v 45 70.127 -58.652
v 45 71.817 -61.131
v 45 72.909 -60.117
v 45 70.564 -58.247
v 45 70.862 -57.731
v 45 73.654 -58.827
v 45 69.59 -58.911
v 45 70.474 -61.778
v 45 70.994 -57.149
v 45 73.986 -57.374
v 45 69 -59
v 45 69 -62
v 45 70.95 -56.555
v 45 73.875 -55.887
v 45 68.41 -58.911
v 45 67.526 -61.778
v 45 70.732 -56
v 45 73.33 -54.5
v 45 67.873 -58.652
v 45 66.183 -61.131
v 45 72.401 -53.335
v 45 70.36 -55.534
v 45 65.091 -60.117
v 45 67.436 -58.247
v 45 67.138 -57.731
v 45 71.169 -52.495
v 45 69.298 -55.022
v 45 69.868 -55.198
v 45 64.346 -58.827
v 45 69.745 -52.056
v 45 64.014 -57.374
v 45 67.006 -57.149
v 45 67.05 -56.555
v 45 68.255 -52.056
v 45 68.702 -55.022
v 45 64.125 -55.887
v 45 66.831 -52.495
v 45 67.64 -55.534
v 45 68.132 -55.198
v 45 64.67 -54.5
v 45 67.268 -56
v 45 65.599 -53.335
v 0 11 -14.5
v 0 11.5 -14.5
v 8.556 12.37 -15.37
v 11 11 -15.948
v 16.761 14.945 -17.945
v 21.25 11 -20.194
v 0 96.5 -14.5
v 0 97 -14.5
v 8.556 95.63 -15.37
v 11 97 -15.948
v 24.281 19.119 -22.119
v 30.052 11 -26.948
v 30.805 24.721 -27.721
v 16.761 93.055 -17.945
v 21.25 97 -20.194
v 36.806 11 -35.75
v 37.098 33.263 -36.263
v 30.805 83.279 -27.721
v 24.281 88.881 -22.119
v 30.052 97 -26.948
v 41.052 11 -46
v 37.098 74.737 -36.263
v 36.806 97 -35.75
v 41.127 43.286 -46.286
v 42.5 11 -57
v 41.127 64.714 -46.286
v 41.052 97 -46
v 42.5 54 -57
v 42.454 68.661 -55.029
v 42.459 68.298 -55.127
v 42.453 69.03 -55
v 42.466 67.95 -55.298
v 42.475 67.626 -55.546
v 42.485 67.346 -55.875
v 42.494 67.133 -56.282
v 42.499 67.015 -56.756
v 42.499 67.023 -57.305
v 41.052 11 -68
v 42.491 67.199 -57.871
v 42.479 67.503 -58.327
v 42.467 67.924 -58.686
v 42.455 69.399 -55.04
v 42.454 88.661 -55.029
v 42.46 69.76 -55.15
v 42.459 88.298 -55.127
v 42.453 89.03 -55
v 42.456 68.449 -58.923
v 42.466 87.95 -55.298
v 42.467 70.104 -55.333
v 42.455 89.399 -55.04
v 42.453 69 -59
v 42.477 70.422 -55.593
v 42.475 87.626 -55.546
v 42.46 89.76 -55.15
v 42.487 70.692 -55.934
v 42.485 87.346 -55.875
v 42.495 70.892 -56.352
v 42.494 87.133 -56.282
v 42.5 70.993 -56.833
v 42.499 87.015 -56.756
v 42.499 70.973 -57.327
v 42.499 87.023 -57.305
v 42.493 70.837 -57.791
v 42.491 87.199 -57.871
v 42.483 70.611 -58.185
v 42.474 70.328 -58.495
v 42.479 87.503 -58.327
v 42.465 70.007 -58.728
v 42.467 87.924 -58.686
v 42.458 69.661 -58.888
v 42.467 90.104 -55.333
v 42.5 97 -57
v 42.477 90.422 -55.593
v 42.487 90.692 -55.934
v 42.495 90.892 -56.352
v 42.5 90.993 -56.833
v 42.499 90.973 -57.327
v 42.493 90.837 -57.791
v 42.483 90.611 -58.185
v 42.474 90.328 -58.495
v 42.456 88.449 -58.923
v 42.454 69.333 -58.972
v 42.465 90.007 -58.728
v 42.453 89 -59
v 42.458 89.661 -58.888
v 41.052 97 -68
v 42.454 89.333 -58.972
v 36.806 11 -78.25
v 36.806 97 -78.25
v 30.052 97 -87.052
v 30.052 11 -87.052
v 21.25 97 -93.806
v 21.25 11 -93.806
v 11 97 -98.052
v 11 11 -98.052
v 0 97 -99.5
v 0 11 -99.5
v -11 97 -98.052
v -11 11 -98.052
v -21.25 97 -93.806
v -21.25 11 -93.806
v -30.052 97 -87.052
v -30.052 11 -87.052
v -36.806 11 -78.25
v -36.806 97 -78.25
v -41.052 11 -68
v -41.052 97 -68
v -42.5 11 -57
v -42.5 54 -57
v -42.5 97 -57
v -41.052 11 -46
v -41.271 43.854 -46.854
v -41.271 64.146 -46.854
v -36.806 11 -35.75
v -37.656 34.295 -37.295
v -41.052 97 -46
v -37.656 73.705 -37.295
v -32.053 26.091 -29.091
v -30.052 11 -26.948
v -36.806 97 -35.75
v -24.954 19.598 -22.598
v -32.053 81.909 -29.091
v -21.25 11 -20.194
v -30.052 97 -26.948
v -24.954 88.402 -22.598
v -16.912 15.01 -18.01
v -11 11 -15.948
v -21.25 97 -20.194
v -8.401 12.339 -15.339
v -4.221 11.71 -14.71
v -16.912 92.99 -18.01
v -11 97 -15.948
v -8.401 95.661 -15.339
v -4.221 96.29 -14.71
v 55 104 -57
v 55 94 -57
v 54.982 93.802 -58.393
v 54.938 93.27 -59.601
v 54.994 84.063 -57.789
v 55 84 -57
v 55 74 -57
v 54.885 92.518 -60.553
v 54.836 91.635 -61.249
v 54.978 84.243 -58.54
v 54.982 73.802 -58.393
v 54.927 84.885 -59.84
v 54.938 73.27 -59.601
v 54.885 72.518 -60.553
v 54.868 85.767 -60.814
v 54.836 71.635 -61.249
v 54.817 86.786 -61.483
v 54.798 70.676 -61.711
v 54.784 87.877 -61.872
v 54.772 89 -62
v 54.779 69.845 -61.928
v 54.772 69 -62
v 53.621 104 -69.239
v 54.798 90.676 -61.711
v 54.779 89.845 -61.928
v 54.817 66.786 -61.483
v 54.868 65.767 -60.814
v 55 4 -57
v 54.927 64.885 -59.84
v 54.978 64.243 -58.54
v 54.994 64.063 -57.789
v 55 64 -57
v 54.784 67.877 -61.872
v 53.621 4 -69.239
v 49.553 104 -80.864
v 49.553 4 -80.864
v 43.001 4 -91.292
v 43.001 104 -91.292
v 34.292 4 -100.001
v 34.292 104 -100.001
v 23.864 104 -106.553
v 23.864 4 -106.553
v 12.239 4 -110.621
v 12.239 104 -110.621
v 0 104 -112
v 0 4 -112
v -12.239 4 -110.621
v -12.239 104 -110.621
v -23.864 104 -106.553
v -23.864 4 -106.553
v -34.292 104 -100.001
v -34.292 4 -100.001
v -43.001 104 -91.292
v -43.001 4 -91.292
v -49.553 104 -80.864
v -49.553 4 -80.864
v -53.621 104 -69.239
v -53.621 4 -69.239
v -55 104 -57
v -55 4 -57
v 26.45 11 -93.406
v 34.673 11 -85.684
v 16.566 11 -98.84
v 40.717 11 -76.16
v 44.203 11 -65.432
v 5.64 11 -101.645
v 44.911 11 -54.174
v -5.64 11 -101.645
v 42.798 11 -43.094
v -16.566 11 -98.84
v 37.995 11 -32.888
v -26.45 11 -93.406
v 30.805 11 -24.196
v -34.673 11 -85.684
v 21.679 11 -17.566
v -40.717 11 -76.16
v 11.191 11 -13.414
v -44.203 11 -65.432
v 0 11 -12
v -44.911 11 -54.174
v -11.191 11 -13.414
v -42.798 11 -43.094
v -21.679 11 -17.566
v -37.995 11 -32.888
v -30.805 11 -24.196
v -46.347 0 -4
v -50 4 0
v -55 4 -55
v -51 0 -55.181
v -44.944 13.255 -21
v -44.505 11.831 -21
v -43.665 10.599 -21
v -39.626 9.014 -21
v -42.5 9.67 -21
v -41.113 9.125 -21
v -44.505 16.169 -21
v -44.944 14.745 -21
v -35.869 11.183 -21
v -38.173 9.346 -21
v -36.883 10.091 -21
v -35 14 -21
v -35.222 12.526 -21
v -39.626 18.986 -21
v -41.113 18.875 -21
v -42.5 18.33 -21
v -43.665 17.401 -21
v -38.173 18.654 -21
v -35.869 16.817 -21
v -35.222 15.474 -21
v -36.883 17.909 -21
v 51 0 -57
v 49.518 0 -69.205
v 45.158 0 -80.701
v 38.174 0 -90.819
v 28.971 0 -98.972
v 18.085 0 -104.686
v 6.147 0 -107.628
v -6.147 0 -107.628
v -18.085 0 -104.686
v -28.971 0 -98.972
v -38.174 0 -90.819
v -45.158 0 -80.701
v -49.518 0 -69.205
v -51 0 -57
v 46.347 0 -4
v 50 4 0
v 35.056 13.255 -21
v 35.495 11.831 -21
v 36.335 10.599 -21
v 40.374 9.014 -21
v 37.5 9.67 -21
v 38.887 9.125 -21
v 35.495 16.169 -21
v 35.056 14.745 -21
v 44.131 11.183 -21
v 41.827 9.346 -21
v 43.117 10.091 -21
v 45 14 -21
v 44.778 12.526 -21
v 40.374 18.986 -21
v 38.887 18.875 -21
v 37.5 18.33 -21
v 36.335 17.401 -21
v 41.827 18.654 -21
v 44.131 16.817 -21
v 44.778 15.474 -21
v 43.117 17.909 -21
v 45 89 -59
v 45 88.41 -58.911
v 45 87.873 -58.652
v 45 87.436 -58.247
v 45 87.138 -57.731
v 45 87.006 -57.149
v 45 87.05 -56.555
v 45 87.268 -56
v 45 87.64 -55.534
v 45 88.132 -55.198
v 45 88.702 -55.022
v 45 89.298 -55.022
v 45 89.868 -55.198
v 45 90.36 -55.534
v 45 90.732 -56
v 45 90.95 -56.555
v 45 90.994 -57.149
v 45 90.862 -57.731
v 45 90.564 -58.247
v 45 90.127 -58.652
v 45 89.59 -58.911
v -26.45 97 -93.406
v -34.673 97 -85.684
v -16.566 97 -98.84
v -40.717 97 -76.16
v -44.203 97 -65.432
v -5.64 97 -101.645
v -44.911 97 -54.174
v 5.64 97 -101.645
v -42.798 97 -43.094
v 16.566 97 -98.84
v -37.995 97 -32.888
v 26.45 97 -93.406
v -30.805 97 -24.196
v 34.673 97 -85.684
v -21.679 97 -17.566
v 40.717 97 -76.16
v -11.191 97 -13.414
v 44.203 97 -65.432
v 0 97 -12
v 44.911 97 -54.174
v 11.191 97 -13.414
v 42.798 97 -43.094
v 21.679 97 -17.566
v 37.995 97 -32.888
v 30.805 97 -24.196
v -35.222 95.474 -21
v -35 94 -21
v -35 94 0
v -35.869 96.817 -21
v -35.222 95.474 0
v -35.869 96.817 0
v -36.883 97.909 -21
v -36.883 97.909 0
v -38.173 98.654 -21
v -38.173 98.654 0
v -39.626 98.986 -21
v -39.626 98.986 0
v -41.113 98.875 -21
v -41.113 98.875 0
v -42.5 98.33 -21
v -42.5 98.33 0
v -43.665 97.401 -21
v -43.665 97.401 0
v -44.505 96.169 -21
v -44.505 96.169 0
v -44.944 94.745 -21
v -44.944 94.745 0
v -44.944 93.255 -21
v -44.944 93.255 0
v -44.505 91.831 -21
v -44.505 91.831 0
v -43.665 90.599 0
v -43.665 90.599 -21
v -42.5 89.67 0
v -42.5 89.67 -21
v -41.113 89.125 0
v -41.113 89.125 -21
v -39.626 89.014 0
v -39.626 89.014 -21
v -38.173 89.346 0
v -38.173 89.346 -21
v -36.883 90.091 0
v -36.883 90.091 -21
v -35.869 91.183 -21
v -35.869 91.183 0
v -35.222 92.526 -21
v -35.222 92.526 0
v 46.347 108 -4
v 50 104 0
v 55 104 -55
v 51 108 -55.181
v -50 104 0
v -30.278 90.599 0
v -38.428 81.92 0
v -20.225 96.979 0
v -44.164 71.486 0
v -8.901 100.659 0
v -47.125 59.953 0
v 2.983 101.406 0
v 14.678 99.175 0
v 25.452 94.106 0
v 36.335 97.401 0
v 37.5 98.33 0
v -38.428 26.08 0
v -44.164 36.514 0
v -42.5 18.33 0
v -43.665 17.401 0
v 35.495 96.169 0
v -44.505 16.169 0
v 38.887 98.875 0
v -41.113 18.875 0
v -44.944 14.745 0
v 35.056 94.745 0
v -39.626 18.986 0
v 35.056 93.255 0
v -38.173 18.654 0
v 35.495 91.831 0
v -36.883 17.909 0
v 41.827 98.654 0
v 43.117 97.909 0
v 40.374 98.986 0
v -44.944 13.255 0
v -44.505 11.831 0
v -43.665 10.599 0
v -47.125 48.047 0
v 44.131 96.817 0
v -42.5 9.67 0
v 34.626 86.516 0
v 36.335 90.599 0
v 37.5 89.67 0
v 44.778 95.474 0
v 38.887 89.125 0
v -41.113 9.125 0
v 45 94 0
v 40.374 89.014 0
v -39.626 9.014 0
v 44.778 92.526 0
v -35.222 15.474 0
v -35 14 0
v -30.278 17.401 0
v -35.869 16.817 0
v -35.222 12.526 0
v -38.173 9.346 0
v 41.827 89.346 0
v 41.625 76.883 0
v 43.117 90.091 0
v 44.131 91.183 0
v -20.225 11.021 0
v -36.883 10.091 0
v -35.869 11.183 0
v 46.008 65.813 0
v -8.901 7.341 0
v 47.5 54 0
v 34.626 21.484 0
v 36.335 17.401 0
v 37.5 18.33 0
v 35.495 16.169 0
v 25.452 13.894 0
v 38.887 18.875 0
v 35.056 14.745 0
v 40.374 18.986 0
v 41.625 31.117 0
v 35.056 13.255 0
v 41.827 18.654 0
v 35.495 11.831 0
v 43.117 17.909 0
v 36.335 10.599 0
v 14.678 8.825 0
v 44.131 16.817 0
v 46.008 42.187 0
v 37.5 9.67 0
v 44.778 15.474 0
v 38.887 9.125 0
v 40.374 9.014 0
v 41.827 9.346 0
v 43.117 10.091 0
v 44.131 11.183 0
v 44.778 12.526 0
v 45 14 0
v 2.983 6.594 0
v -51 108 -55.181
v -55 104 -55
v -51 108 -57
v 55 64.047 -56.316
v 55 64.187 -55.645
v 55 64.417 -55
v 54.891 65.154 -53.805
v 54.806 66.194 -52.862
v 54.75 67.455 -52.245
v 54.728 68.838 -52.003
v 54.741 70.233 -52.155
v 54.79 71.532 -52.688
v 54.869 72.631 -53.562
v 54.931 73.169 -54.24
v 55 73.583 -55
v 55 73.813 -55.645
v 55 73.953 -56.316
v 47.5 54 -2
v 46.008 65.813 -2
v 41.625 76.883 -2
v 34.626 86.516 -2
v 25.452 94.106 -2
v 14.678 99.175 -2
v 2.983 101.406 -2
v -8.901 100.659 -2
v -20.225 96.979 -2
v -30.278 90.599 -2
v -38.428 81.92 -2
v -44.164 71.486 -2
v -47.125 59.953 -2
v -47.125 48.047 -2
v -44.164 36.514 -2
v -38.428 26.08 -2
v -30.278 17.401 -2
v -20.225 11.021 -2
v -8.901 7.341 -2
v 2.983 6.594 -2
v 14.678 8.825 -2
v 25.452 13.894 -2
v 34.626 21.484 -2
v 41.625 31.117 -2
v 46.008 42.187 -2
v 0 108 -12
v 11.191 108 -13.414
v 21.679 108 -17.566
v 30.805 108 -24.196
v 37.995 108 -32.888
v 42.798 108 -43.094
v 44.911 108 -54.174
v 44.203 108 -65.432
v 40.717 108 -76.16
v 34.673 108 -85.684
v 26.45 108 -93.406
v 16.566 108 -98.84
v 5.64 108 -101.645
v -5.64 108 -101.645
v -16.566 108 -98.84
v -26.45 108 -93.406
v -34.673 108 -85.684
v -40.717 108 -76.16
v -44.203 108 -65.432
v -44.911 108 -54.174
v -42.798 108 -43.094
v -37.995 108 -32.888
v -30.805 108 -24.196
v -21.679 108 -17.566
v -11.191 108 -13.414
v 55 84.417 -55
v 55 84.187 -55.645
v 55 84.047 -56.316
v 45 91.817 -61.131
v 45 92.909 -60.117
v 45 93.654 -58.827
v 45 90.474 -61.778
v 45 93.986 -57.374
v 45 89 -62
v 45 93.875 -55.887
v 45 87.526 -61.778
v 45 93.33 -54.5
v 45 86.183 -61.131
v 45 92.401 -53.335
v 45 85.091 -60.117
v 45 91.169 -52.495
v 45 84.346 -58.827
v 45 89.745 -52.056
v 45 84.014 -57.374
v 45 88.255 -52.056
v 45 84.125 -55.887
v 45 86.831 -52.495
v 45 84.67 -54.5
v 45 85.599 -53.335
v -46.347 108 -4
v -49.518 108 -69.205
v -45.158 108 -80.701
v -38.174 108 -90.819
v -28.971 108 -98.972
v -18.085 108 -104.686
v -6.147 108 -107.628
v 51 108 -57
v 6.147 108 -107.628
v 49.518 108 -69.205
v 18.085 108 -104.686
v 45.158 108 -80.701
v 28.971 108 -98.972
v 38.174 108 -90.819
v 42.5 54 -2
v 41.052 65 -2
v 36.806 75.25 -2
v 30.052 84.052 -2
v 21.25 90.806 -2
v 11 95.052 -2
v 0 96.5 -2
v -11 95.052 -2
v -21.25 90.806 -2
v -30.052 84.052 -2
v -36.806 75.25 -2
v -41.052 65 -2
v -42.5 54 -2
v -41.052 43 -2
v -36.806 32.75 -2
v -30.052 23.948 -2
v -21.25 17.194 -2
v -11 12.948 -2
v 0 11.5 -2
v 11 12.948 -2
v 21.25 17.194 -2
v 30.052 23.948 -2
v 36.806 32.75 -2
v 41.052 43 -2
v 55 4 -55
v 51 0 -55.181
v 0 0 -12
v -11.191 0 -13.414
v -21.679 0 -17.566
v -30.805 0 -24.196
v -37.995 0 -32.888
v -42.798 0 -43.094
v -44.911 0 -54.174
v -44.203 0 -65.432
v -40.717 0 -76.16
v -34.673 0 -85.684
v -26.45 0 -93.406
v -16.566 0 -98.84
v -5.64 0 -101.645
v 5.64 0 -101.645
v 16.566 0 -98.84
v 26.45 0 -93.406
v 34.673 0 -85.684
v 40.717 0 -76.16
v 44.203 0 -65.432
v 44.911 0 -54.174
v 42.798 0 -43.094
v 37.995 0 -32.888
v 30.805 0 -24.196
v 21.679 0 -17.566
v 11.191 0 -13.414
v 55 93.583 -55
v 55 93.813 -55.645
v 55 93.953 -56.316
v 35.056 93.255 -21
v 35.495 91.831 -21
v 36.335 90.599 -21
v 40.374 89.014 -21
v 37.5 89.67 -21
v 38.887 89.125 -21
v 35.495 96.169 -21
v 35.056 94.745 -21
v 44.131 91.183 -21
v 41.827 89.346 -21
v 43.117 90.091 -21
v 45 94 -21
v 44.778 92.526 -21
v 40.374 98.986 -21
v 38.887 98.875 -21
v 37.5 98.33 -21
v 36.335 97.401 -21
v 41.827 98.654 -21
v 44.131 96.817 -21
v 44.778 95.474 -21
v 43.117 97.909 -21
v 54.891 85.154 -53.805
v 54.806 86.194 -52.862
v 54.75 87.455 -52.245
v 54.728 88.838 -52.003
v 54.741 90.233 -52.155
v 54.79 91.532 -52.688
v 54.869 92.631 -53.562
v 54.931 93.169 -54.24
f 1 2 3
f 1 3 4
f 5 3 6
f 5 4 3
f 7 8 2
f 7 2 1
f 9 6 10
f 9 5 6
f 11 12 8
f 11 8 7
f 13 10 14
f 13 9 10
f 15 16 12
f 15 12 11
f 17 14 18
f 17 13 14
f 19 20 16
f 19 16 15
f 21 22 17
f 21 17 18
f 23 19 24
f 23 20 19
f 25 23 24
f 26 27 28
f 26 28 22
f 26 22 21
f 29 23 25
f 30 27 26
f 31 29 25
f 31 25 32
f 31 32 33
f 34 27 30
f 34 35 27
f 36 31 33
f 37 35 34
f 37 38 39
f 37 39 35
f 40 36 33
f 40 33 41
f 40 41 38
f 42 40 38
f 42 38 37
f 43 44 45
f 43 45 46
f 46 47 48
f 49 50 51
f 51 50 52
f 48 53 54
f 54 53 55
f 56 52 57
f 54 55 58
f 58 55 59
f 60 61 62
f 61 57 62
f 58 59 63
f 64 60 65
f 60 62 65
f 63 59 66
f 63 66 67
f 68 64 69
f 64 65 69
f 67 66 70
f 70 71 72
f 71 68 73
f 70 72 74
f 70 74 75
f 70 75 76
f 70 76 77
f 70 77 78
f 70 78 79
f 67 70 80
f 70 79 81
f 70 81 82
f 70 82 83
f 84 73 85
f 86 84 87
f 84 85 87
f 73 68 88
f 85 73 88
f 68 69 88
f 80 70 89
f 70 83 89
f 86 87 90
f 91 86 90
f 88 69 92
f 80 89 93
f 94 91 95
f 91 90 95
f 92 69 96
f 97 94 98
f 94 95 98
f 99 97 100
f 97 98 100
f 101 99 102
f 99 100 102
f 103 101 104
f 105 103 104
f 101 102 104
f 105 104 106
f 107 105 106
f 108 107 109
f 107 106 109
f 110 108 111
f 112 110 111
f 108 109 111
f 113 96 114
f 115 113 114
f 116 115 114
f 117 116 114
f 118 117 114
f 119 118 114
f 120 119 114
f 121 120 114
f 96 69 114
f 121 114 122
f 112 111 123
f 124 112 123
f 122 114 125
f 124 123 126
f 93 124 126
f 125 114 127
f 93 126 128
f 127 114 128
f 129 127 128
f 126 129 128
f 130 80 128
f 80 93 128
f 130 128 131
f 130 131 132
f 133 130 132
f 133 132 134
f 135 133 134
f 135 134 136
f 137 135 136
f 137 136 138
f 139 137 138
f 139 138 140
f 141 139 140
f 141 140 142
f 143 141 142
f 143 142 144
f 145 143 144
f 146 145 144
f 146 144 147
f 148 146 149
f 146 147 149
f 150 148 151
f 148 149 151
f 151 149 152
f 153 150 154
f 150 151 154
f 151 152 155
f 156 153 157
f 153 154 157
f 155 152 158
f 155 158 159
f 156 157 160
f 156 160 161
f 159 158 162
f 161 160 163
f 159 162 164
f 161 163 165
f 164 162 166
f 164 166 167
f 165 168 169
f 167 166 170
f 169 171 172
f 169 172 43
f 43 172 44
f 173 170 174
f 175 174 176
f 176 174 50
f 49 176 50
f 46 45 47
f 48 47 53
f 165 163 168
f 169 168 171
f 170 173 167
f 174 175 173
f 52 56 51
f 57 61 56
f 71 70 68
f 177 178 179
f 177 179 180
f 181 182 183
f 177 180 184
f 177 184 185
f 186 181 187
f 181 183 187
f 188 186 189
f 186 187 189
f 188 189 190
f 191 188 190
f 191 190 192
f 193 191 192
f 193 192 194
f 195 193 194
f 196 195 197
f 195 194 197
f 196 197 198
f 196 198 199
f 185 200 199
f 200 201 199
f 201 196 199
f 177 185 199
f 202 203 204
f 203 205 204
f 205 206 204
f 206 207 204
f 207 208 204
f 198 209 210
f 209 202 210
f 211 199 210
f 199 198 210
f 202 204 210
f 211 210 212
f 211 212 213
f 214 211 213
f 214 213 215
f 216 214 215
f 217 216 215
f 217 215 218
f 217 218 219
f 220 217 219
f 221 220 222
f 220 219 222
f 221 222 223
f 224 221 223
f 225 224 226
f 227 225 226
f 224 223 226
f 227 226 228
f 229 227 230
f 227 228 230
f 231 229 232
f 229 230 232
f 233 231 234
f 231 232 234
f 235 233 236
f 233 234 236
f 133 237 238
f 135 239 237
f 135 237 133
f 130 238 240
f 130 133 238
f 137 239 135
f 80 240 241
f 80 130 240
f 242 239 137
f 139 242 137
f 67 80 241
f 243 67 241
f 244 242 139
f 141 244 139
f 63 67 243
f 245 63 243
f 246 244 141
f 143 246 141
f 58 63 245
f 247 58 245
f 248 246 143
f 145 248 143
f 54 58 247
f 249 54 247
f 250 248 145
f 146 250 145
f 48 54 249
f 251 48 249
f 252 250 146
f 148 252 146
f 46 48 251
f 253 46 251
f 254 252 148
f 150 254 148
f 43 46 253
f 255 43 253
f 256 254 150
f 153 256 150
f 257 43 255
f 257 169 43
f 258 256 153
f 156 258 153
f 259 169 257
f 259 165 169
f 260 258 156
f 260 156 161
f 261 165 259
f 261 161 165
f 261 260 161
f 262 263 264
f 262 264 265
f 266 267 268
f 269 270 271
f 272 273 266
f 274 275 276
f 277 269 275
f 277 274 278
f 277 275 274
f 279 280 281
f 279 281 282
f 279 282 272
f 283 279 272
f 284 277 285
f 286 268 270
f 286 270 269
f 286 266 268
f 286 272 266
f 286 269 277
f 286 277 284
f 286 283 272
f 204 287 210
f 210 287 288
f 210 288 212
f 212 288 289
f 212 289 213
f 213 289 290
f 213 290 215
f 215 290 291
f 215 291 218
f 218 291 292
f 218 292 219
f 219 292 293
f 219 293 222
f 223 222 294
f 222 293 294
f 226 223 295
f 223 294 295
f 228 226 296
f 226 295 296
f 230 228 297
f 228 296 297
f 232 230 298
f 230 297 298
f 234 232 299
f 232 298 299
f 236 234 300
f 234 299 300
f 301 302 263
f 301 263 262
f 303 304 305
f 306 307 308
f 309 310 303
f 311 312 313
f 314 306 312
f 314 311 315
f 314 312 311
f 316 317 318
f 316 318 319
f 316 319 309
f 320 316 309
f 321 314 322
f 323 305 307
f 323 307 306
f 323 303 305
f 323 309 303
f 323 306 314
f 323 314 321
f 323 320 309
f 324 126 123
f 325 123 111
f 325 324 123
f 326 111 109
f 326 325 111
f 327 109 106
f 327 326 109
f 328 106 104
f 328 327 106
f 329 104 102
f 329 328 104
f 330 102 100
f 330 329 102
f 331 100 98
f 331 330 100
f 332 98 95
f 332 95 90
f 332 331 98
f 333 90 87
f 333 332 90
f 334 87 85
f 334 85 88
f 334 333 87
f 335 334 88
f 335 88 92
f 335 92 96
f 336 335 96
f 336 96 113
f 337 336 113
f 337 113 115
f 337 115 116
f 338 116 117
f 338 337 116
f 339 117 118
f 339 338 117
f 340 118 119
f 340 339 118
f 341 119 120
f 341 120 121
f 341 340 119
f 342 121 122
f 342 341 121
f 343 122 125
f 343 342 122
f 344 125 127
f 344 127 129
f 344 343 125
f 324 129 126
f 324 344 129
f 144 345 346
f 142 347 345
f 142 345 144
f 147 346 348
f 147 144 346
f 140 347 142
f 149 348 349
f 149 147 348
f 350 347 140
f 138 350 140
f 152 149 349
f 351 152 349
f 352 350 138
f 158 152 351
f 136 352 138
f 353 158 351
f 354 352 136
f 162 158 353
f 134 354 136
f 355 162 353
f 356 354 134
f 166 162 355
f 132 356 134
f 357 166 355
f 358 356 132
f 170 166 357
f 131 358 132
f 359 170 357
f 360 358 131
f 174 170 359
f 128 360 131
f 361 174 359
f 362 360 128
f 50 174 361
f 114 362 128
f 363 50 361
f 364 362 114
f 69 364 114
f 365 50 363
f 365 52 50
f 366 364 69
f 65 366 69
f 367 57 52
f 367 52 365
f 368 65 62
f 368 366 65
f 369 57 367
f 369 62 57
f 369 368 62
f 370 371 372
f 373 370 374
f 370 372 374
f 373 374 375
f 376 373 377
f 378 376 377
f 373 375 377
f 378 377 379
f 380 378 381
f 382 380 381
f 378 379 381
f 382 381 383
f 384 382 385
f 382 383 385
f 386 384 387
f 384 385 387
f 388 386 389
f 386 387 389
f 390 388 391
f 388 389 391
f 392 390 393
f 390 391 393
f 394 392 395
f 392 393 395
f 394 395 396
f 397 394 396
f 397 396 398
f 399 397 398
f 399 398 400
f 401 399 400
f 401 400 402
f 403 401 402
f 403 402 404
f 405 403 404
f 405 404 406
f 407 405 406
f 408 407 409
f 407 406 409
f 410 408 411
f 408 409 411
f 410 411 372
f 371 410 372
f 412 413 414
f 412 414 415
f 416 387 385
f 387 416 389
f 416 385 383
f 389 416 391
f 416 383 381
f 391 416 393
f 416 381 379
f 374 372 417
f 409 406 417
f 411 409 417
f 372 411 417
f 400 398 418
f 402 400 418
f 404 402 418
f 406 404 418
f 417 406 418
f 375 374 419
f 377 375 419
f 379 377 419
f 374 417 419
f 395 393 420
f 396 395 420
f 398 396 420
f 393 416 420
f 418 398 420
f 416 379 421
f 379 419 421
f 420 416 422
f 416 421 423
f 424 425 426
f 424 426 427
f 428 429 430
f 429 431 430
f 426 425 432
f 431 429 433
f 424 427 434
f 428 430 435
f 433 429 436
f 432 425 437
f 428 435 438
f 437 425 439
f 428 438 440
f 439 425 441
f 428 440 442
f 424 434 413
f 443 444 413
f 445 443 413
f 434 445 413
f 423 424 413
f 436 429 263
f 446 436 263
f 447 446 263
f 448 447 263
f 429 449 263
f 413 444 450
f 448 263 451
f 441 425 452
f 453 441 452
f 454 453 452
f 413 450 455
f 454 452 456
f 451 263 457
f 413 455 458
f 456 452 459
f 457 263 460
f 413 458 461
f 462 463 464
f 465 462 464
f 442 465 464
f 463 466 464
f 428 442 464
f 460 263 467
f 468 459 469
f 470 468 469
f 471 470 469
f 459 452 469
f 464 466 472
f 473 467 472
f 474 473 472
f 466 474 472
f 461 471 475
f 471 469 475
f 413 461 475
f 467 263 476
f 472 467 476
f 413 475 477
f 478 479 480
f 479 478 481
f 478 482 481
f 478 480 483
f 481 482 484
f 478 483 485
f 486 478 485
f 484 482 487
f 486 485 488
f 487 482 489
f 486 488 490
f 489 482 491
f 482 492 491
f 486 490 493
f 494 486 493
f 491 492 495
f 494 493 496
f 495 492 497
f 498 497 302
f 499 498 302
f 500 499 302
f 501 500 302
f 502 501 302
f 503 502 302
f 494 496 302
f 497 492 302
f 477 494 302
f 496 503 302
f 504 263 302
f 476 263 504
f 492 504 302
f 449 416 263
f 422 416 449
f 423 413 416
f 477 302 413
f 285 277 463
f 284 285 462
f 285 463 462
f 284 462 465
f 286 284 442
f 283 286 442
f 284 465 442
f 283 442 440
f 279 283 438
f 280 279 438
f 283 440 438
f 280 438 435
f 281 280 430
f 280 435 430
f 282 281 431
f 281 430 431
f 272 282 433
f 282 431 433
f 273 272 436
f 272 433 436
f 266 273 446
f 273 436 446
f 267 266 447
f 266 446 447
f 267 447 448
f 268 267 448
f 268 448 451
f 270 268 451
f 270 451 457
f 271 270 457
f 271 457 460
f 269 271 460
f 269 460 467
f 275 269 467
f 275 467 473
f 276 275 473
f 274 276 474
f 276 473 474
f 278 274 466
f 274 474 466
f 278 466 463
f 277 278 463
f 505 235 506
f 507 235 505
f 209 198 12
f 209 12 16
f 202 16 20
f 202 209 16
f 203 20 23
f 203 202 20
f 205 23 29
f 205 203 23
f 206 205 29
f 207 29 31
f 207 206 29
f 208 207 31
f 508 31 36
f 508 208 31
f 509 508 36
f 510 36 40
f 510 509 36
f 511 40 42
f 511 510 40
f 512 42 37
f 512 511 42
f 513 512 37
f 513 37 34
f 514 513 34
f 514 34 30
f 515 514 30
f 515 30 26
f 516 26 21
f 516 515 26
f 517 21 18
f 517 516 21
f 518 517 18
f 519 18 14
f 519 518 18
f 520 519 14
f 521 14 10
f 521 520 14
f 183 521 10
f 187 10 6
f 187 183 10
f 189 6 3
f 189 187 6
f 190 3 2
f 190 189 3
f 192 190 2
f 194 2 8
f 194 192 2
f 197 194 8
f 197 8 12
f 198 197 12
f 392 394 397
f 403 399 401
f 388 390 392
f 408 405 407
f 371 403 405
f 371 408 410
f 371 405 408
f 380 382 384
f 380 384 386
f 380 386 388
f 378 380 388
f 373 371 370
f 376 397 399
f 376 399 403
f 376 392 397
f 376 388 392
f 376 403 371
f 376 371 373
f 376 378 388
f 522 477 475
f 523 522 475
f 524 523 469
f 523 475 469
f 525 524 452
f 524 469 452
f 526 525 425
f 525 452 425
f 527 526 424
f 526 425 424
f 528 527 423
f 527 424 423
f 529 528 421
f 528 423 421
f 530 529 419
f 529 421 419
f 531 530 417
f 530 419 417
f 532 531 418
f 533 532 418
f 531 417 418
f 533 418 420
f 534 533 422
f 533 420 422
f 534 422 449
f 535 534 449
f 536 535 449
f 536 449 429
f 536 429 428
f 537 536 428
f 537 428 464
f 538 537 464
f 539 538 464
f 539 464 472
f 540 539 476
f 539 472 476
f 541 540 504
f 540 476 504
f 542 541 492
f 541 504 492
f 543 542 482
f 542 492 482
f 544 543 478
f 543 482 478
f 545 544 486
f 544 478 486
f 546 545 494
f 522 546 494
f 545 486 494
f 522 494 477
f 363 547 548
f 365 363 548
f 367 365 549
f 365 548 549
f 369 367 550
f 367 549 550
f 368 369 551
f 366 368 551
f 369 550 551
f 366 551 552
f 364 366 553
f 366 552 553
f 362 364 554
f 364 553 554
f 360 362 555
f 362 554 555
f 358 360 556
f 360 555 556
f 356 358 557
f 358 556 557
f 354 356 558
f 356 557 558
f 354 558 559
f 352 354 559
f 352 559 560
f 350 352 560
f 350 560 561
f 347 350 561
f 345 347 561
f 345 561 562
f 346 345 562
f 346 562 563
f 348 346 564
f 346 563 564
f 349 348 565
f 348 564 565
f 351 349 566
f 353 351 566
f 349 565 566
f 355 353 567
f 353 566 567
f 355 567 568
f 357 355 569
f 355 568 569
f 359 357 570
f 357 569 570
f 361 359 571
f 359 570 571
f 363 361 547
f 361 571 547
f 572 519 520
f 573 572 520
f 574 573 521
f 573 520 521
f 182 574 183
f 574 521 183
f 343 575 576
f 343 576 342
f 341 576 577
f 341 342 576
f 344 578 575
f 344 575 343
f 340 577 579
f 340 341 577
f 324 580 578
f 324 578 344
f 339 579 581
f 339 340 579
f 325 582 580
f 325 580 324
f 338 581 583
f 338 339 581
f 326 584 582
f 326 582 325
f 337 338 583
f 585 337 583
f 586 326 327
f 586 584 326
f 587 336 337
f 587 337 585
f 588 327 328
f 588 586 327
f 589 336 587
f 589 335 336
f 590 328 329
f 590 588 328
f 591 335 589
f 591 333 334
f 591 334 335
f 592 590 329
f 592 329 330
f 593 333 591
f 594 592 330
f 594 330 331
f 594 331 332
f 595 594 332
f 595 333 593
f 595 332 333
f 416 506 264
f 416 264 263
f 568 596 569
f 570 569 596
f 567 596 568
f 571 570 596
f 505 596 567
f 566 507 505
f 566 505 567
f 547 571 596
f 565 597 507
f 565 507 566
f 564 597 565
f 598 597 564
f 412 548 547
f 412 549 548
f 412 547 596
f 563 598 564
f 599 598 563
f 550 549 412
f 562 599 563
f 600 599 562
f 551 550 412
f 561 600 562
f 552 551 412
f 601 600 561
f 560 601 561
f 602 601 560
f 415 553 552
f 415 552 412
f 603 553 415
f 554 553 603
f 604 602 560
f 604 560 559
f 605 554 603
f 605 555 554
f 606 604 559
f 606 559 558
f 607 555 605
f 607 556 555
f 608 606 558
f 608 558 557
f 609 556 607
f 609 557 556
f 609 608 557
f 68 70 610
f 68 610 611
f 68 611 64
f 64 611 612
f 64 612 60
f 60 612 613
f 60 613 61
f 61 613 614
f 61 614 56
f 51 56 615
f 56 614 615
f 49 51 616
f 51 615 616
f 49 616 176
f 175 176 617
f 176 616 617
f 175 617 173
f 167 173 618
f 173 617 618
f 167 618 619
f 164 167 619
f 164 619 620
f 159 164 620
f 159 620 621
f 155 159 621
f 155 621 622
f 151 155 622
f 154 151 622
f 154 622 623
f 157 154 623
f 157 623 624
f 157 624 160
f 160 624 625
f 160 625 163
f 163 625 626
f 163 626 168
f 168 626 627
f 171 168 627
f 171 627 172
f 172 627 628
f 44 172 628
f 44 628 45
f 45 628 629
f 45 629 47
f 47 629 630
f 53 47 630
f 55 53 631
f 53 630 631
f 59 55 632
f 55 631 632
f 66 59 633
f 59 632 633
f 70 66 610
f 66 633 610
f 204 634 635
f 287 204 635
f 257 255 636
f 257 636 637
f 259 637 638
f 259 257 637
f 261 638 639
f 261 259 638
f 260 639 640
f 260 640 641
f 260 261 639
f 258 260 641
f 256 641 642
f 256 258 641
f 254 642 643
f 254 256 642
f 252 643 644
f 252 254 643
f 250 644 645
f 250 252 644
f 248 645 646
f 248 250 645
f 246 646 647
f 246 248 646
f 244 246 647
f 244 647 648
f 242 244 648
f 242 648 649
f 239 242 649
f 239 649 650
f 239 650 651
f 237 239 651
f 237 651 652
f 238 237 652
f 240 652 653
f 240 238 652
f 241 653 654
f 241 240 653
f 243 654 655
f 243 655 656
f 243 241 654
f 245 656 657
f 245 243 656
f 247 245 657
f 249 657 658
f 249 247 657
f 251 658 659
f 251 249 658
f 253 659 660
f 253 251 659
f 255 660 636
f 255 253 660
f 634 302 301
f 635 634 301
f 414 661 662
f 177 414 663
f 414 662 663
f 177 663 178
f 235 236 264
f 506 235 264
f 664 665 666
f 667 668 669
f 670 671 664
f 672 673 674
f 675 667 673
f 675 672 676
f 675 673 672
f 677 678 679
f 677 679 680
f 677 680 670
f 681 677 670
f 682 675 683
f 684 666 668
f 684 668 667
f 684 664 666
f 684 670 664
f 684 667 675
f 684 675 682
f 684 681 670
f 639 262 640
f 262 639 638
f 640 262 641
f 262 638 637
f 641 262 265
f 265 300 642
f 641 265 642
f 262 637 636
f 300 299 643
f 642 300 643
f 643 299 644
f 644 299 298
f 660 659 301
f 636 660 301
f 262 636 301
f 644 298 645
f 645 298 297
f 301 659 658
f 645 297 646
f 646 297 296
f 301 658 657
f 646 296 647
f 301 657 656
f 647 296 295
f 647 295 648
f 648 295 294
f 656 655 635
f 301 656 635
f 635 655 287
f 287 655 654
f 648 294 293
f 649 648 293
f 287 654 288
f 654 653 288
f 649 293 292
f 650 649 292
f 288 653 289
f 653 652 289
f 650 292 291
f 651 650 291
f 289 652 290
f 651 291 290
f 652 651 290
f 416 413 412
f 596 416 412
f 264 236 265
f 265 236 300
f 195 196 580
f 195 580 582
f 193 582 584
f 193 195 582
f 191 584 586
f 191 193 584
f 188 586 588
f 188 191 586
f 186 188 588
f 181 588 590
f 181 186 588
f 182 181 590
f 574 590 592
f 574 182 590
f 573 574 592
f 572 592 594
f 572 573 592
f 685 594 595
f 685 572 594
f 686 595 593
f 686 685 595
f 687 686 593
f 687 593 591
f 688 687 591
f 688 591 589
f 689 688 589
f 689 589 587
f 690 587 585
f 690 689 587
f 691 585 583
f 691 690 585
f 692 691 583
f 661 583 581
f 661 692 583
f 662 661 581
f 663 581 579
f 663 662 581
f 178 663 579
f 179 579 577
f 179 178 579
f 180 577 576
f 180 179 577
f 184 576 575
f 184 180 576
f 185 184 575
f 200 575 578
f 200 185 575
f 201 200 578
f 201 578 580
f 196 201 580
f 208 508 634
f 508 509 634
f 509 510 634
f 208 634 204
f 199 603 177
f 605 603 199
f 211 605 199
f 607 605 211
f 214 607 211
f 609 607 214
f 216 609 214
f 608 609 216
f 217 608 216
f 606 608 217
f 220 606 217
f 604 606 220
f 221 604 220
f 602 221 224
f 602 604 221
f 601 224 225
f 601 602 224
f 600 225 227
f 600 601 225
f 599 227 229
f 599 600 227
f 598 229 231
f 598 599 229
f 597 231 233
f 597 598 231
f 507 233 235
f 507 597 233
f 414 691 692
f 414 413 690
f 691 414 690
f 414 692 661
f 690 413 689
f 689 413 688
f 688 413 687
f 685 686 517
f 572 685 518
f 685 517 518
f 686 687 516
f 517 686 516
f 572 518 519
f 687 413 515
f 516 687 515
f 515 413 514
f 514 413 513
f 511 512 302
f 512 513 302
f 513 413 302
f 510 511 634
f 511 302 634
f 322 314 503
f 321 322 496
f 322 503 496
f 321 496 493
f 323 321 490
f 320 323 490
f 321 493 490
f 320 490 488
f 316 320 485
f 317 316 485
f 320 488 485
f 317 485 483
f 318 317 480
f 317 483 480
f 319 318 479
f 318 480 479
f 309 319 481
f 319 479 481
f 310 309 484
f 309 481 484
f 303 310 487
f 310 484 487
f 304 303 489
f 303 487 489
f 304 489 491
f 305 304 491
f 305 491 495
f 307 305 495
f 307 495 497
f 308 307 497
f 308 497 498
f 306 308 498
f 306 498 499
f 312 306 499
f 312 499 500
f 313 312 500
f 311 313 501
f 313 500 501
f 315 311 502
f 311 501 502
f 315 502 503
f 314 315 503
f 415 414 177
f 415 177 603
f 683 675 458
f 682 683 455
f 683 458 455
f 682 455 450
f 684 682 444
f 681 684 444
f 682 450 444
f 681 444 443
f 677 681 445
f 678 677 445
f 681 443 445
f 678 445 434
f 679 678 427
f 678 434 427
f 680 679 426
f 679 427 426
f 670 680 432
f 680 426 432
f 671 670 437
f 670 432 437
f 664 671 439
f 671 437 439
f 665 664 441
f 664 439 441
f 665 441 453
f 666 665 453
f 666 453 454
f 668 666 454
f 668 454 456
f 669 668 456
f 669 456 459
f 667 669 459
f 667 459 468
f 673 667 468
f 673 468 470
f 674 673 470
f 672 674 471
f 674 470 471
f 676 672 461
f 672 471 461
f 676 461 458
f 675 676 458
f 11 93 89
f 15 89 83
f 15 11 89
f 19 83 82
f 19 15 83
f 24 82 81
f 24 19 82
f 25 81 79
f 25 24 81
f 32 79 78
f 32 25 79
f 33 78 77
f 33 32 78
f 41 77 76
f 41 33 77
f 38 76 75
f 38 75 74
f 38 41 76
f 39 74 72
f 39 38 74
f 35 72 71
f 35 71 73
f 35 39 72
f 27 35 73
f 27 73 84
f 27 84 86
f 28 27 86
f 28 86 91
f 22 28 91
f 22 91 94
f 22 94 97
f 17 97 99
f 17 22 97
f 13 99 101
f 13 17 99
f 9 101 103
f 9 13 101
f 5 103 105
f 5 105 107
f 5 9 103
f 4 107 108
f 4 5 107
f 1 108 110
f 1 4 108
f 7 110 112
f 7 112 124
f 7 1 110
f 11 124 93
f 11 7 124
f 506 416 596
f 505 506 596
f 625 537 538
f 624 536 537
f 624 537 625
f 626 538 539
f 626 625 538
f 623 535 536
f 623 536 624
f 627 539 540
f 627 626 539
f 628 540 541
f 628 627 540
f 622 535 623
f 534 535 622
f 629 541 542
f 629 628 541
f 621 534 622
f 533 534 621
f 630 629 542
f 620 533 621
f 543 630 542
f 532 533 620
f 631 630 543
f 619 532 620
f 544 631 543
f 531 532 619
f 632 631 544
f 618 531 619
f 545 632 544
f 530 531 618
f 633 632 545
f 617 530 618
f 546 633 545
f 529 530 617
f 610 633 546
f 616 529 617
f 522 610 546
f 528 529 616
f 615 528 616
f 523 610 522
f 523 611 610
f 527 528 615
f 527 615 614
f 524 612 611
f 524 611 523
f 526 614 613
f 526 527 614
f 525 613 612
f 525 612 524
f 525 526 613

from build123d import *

# Parameters (mm, degrees)
EXTRUDE_2_DEPTH     = 108
CHAMFER_2_SIZE      = 4
SKETCH_3_R          = 42.5
CUT_EXTRUDE_1_DEPTH = 166.024240644
SKETCH_4_R          = 45
CUT_EXTRUDE_2_DEPTH = 11
CUT_EXTRUDE_START   = -11
SKETCH_5_R          = 45
CUT_EXTRUDE_3_DEPTH = 11
SKETCH_6_R          = 5
CUT_EXTRUDE_4_DEPTH = 21
SKETCH_10_R         = 47.5
CUT_EXTRUDE_5_DEPTH = 2
SKETCH_11_R         = 42.5
CUT_EXTRUDE_6_DEPTH = 55


with BuildPart() as part:
    # 草图2 → 凸台-拉伸2 (new body)
    with BuildSketch(Plane(origin=(0, 0, 0), x_dir=(1, 0, 0), z_dir=(0, 1, 0))):
        with BuildLine():
            Line((-50, 0), (50, 0))
            Line((50, 0), (55, 55))
            Line((55, 55), (55, 57))
            ThreePointArc((55, 57), (0, 112), (-55, 57))
            Line((-55, 57), (-55, 55))
            Line((-55, 55), (-50, 0))
        make_face()
    extrude(amount=EXTRUDE_2_DEPTH)

    # 倒角2
    # the kernel refuses this chamfer: 4 mm, written as the material it takes off along each edge
    with BuildSketch(Plane(origin=(-55.931316952, 108, -65.244486468), x_dir=(-0.02738295672235633, -0.9996219169112968, 0.00248935970203239), z_dir=(0.0905357460425184, 0, 0.9958932064677039)), Plane(origin=(49.068683048, 108, 10.244486468), x_dir=(0.027382956722356445, -0.9996219169112968, 0.0024893597020324005), z_dir=(0.0905357460425184, 0, -0.9958932064677039))) as chamfer_2_piece_1:
        Polygon((CHAMFER_2_SIZE * 0.999621916911, CHAMFER_2_SIZE * 0.0274958766106), (-CHAMFER_2_SIZE * 0.0274958766106, CHAMFER_2_SIZE * 0.999621916911), (0, 0), align=None)
    extrude(amount=75.80026899, mode=Mode.SUBTRACT)
    with BuildSketch(Plane(origin=(-60.286731952, 108, 0), x_dir=(0, -0.9996219169112968, 0.02749587661058639), z_dir=(1, 0, 0))) as chamfer_2_piece_2:
        Polygon((CHAMFER_2_SIZE * 0.999621916911, CHAMFER_2_SIZE * 0.0274958766106), (-CHAMFER_2_SIZE * 0.0274958766106, CHAMFER_2_SIZE * 0.999621916911), (0, 0), align=None)
    extrude(amount=120.573463904, mode=Mode.SUBTRACT)
    with BuildSketch(Plane(origin=(55, 108, -44.713268048), x_dir=(0.027495876610585647, -0.9996219169112968, 0), z_dir=(0, 0, -1)), Plane(origin=(-55, 108, -57), x_dir=(-0.027495876610585647, -0.9996219169112968, 0), z_dir=(0, 0, 1))) as chamfer_2_piece_3:
        Polygon((CHAMFER_2_SIZE * 0.999621916911, CHAMFER_2_SIZE * 0.0274958766106), (-CHAMFER_2_SIZE * 0.0274958766106, CHAMFER_2_SIZE * 0.999621916911), (0, 0), align=None)
    extrude(amount=12.286731952, mode=Mode.SUBTRACT)
    with BuildSketch(Plane(origin=(0, 108, -57), x_dir=(1, 0, 0), z_dir=(0, 0, 1))) as chamfer_2_piece_4:
        Polygon((55, -CHAMFER_2_SIZE), (55 - CHAMFER_2_SIZE, 0), (55, 0), align=None)
    revolve(axis=Axis((0, 108, -57), (0, 1, 0)), revolution_arc=180, mode=Mode.SUBTRACT)
    with BuildSketch(Plane(origin=(55, 0, -44.713268048), x_dir=(0.02749587661058563, 0.9996219169112968, 0), z_dir=(0, 0, -1)), Plane(origin=(-55, 0, -57), x_dir=(-0.02749587661058563, 0.9996219169112968, 0), z_dir=(0, 0, 1))) as chamfer_2_piece_5:
        Polygon((CHAMFER_2_SIZE * 0.999621916911, -CHAMFER_2_SIZE * 0.0274958766106), (-CHAMFER_2_SIZE * 0.0274958766106, -CHAMFER_2_SIZE * 0.999621916911), (0, 0), align=None)
    extrude(amount=12.286731952, mode=Mode.SUBTRACT)
    with BuildSketch(Plane(origin=(49.068683048, 0, 10.244486468), x_dir=(0.027382956722356428, 0.9996219169112968, 0.0024893597020323992), z_dir=(0.0905357460425184, 0, -0.9958932064677039)), Plane(origin=(-55.931316952, 0, -65.244486468), x_dir=(-0.027382956722356314, 0.9996219169112968, 0.0024893597020323884), z_dir=(0.0905357460425184, 0, 0.9958932064677039))) as chamfer_2_piece_6:
        Polygon((CHAMFER_2_SIZE * 0.999621916911, -CHAMFER_2_SIZE * 0.0274958766106), (-CHAMFER_2_SIZE * 0.0274958766106, -CHAMFER_2_SIZE * 0.999621916911), (0, 0), align=None)
    extrude(amount=75.80026899, mode=Mode.SUBTRACT)
    with BuildSketch(Plane(origin=(-60.286731952, 0, 0), x_dir=(0, 0.9996219169112968, 0.027495876610586372), z_dir=(1, 0, 0))) as chamfer_2_piece_7:
        Polygon((CHAMFER_2_SIZE * 0.999621916911, -CHAMFER_2_SIZE * 0.0274958766106), (-CHAMFER_2_SIZE * 0.0274958766106, -CHAMFER_2_SIZE * 0.999621916911), (0, 0), align=None)
    extrude(amount=120.573463904, mode=Mode.SUBTRACT)
    with BuildSketch(Plane(origin=(0, 0, -57), x_dir=(1, 0, 0), z_dir=(0, 0, 1))) as chamfer_2_piece_8:
        Polygon((55, CHAMFER_2_SIZE), (55 - CHAMFER_2_SIZE, 0), (55, 0), align=None)
    revolve(axis=Axis((0, 0, -57), (0, 1, 0)), revolution_arc=180, mode=Mode.SUBTRACT)

    # 草图3 → 切除-拉伸1 (cut, through all)
    with BuildSketch(Plane(origin=(0, 108, 0), x_dir=(1, 0, 0), z_dir=(0, 1, 0))):
        with Locations(Location((0, 57, 0), (0, 0, 270))):
            Circle(SKETCH_3_R)
    extrude(amount=-CUT_EXTRUDE_1_DEPTH, mode=Mode.SUBTRACT)

    # 草图4 → 切除-拉伸2 (cut)
    with BuildSketch(Plane(origin=(0, 108, 0), x_dir=(1, 0, 0), z_dir=(0, 1, 0))):
        with Locations(Location((0, 57, 0), (0, 0, 270))):
            Circle(SKETCH_4_R)
    extrude(amount=-CUT_EXTRUDE_2_DEPTH, mode=Mode.SUBTRACT)

    # 草图5 → 切除-拉伸3 (cut)
    with BuildSketch(Plane.XZ.offset(CUT_EXTRUDE_START)):
        with Locations(Location((0, -57, 0), (0, 0, 90))):
            Circle(SKETCH_5_R)
    extrude(amount=CUT_EXTRUDE_3_DEPTH, mode=Mode.SUBTRACT)

    # 草图6 → 切除-拉伸4 (cut)
    with BuildSketch(Plane.XY):
        with Locations((40, 94)):
            Circle(SKETCH_6_R)
        with Locations((-40, 94)):
            Circle(SKETCH_6_R)
        with Locations((-40, 14)):
            Circle(SKETCH_6_R)
        with Locations((40, 14)):
            Circle(SKETCH_6_R)
    extrude(amount=-CUT_EXTRUDE_4_DEPTH, mode=Mode.SUBTRACT)

    # 草图8 → 切除-旋转2 (revolve, cut)
    with BuildSketch(Plane(origin=(0, 89, 0), x_dir=(1, 0, 0), z_dir=(0, 1, 0)), mode=Mode.PRIVATE) as cut_revolve_2_sk:
        Polygon((55, 57), (25, 57), (25, 55), (45, 55), (45, 52), (55, 52), align=None)
    revolve(cut_revolve_2_sk.sketch.rotate(Axis((51, 89, -57), (-1, 0, 0)), 180), axis=Axis((51, 89, -57), (-1, 0, 0)), mode=Mode.SUBTRACT)

    # 草图9 → 切除-旋转3 (revolve, cut)
    with BuildSketch(Plane(origin=(0, 69, 0), x_dir=(1, 0, 0), z_dir=(0, 1, 0)), mode=Mode.PRIVATE) as cut_revolve_3_sk:
        Polygon((55, 57), (25, 57), (25, 55), (45, 55), (45, 52), (55, 52), align=None)
    revolve(cut_revolve_3_sk.sketch.rotate(Axis((55, 69, -57), (-1, 0, 0)), 180), axis=Axis((55, 69, -57), (-1, 0, 0)), mode=Mode.SUBTRACT)

    # 草图10 → 切除-拉伸5 (cut)
    with BuildSketch(Plane.XY):
        with Locations((0, 54)):
            Circle(SKETCH_10_R)
    extrude(amount=-CUT_EXTRUDE_5_DEPTH, mode=Mode.SUBTRACT)

    # 草图11 → 切除-拉伸6 (cut)
    with BuildSketch(Plane.XY.offset(-2)):
        with Locations((0, 54)):
            Circle(SKETCH_11_R)
    extrude(amount=-CUT_EXTRUDE_6_DEPTH, mode=Mode.SUBTRACT)


solid = part.part
